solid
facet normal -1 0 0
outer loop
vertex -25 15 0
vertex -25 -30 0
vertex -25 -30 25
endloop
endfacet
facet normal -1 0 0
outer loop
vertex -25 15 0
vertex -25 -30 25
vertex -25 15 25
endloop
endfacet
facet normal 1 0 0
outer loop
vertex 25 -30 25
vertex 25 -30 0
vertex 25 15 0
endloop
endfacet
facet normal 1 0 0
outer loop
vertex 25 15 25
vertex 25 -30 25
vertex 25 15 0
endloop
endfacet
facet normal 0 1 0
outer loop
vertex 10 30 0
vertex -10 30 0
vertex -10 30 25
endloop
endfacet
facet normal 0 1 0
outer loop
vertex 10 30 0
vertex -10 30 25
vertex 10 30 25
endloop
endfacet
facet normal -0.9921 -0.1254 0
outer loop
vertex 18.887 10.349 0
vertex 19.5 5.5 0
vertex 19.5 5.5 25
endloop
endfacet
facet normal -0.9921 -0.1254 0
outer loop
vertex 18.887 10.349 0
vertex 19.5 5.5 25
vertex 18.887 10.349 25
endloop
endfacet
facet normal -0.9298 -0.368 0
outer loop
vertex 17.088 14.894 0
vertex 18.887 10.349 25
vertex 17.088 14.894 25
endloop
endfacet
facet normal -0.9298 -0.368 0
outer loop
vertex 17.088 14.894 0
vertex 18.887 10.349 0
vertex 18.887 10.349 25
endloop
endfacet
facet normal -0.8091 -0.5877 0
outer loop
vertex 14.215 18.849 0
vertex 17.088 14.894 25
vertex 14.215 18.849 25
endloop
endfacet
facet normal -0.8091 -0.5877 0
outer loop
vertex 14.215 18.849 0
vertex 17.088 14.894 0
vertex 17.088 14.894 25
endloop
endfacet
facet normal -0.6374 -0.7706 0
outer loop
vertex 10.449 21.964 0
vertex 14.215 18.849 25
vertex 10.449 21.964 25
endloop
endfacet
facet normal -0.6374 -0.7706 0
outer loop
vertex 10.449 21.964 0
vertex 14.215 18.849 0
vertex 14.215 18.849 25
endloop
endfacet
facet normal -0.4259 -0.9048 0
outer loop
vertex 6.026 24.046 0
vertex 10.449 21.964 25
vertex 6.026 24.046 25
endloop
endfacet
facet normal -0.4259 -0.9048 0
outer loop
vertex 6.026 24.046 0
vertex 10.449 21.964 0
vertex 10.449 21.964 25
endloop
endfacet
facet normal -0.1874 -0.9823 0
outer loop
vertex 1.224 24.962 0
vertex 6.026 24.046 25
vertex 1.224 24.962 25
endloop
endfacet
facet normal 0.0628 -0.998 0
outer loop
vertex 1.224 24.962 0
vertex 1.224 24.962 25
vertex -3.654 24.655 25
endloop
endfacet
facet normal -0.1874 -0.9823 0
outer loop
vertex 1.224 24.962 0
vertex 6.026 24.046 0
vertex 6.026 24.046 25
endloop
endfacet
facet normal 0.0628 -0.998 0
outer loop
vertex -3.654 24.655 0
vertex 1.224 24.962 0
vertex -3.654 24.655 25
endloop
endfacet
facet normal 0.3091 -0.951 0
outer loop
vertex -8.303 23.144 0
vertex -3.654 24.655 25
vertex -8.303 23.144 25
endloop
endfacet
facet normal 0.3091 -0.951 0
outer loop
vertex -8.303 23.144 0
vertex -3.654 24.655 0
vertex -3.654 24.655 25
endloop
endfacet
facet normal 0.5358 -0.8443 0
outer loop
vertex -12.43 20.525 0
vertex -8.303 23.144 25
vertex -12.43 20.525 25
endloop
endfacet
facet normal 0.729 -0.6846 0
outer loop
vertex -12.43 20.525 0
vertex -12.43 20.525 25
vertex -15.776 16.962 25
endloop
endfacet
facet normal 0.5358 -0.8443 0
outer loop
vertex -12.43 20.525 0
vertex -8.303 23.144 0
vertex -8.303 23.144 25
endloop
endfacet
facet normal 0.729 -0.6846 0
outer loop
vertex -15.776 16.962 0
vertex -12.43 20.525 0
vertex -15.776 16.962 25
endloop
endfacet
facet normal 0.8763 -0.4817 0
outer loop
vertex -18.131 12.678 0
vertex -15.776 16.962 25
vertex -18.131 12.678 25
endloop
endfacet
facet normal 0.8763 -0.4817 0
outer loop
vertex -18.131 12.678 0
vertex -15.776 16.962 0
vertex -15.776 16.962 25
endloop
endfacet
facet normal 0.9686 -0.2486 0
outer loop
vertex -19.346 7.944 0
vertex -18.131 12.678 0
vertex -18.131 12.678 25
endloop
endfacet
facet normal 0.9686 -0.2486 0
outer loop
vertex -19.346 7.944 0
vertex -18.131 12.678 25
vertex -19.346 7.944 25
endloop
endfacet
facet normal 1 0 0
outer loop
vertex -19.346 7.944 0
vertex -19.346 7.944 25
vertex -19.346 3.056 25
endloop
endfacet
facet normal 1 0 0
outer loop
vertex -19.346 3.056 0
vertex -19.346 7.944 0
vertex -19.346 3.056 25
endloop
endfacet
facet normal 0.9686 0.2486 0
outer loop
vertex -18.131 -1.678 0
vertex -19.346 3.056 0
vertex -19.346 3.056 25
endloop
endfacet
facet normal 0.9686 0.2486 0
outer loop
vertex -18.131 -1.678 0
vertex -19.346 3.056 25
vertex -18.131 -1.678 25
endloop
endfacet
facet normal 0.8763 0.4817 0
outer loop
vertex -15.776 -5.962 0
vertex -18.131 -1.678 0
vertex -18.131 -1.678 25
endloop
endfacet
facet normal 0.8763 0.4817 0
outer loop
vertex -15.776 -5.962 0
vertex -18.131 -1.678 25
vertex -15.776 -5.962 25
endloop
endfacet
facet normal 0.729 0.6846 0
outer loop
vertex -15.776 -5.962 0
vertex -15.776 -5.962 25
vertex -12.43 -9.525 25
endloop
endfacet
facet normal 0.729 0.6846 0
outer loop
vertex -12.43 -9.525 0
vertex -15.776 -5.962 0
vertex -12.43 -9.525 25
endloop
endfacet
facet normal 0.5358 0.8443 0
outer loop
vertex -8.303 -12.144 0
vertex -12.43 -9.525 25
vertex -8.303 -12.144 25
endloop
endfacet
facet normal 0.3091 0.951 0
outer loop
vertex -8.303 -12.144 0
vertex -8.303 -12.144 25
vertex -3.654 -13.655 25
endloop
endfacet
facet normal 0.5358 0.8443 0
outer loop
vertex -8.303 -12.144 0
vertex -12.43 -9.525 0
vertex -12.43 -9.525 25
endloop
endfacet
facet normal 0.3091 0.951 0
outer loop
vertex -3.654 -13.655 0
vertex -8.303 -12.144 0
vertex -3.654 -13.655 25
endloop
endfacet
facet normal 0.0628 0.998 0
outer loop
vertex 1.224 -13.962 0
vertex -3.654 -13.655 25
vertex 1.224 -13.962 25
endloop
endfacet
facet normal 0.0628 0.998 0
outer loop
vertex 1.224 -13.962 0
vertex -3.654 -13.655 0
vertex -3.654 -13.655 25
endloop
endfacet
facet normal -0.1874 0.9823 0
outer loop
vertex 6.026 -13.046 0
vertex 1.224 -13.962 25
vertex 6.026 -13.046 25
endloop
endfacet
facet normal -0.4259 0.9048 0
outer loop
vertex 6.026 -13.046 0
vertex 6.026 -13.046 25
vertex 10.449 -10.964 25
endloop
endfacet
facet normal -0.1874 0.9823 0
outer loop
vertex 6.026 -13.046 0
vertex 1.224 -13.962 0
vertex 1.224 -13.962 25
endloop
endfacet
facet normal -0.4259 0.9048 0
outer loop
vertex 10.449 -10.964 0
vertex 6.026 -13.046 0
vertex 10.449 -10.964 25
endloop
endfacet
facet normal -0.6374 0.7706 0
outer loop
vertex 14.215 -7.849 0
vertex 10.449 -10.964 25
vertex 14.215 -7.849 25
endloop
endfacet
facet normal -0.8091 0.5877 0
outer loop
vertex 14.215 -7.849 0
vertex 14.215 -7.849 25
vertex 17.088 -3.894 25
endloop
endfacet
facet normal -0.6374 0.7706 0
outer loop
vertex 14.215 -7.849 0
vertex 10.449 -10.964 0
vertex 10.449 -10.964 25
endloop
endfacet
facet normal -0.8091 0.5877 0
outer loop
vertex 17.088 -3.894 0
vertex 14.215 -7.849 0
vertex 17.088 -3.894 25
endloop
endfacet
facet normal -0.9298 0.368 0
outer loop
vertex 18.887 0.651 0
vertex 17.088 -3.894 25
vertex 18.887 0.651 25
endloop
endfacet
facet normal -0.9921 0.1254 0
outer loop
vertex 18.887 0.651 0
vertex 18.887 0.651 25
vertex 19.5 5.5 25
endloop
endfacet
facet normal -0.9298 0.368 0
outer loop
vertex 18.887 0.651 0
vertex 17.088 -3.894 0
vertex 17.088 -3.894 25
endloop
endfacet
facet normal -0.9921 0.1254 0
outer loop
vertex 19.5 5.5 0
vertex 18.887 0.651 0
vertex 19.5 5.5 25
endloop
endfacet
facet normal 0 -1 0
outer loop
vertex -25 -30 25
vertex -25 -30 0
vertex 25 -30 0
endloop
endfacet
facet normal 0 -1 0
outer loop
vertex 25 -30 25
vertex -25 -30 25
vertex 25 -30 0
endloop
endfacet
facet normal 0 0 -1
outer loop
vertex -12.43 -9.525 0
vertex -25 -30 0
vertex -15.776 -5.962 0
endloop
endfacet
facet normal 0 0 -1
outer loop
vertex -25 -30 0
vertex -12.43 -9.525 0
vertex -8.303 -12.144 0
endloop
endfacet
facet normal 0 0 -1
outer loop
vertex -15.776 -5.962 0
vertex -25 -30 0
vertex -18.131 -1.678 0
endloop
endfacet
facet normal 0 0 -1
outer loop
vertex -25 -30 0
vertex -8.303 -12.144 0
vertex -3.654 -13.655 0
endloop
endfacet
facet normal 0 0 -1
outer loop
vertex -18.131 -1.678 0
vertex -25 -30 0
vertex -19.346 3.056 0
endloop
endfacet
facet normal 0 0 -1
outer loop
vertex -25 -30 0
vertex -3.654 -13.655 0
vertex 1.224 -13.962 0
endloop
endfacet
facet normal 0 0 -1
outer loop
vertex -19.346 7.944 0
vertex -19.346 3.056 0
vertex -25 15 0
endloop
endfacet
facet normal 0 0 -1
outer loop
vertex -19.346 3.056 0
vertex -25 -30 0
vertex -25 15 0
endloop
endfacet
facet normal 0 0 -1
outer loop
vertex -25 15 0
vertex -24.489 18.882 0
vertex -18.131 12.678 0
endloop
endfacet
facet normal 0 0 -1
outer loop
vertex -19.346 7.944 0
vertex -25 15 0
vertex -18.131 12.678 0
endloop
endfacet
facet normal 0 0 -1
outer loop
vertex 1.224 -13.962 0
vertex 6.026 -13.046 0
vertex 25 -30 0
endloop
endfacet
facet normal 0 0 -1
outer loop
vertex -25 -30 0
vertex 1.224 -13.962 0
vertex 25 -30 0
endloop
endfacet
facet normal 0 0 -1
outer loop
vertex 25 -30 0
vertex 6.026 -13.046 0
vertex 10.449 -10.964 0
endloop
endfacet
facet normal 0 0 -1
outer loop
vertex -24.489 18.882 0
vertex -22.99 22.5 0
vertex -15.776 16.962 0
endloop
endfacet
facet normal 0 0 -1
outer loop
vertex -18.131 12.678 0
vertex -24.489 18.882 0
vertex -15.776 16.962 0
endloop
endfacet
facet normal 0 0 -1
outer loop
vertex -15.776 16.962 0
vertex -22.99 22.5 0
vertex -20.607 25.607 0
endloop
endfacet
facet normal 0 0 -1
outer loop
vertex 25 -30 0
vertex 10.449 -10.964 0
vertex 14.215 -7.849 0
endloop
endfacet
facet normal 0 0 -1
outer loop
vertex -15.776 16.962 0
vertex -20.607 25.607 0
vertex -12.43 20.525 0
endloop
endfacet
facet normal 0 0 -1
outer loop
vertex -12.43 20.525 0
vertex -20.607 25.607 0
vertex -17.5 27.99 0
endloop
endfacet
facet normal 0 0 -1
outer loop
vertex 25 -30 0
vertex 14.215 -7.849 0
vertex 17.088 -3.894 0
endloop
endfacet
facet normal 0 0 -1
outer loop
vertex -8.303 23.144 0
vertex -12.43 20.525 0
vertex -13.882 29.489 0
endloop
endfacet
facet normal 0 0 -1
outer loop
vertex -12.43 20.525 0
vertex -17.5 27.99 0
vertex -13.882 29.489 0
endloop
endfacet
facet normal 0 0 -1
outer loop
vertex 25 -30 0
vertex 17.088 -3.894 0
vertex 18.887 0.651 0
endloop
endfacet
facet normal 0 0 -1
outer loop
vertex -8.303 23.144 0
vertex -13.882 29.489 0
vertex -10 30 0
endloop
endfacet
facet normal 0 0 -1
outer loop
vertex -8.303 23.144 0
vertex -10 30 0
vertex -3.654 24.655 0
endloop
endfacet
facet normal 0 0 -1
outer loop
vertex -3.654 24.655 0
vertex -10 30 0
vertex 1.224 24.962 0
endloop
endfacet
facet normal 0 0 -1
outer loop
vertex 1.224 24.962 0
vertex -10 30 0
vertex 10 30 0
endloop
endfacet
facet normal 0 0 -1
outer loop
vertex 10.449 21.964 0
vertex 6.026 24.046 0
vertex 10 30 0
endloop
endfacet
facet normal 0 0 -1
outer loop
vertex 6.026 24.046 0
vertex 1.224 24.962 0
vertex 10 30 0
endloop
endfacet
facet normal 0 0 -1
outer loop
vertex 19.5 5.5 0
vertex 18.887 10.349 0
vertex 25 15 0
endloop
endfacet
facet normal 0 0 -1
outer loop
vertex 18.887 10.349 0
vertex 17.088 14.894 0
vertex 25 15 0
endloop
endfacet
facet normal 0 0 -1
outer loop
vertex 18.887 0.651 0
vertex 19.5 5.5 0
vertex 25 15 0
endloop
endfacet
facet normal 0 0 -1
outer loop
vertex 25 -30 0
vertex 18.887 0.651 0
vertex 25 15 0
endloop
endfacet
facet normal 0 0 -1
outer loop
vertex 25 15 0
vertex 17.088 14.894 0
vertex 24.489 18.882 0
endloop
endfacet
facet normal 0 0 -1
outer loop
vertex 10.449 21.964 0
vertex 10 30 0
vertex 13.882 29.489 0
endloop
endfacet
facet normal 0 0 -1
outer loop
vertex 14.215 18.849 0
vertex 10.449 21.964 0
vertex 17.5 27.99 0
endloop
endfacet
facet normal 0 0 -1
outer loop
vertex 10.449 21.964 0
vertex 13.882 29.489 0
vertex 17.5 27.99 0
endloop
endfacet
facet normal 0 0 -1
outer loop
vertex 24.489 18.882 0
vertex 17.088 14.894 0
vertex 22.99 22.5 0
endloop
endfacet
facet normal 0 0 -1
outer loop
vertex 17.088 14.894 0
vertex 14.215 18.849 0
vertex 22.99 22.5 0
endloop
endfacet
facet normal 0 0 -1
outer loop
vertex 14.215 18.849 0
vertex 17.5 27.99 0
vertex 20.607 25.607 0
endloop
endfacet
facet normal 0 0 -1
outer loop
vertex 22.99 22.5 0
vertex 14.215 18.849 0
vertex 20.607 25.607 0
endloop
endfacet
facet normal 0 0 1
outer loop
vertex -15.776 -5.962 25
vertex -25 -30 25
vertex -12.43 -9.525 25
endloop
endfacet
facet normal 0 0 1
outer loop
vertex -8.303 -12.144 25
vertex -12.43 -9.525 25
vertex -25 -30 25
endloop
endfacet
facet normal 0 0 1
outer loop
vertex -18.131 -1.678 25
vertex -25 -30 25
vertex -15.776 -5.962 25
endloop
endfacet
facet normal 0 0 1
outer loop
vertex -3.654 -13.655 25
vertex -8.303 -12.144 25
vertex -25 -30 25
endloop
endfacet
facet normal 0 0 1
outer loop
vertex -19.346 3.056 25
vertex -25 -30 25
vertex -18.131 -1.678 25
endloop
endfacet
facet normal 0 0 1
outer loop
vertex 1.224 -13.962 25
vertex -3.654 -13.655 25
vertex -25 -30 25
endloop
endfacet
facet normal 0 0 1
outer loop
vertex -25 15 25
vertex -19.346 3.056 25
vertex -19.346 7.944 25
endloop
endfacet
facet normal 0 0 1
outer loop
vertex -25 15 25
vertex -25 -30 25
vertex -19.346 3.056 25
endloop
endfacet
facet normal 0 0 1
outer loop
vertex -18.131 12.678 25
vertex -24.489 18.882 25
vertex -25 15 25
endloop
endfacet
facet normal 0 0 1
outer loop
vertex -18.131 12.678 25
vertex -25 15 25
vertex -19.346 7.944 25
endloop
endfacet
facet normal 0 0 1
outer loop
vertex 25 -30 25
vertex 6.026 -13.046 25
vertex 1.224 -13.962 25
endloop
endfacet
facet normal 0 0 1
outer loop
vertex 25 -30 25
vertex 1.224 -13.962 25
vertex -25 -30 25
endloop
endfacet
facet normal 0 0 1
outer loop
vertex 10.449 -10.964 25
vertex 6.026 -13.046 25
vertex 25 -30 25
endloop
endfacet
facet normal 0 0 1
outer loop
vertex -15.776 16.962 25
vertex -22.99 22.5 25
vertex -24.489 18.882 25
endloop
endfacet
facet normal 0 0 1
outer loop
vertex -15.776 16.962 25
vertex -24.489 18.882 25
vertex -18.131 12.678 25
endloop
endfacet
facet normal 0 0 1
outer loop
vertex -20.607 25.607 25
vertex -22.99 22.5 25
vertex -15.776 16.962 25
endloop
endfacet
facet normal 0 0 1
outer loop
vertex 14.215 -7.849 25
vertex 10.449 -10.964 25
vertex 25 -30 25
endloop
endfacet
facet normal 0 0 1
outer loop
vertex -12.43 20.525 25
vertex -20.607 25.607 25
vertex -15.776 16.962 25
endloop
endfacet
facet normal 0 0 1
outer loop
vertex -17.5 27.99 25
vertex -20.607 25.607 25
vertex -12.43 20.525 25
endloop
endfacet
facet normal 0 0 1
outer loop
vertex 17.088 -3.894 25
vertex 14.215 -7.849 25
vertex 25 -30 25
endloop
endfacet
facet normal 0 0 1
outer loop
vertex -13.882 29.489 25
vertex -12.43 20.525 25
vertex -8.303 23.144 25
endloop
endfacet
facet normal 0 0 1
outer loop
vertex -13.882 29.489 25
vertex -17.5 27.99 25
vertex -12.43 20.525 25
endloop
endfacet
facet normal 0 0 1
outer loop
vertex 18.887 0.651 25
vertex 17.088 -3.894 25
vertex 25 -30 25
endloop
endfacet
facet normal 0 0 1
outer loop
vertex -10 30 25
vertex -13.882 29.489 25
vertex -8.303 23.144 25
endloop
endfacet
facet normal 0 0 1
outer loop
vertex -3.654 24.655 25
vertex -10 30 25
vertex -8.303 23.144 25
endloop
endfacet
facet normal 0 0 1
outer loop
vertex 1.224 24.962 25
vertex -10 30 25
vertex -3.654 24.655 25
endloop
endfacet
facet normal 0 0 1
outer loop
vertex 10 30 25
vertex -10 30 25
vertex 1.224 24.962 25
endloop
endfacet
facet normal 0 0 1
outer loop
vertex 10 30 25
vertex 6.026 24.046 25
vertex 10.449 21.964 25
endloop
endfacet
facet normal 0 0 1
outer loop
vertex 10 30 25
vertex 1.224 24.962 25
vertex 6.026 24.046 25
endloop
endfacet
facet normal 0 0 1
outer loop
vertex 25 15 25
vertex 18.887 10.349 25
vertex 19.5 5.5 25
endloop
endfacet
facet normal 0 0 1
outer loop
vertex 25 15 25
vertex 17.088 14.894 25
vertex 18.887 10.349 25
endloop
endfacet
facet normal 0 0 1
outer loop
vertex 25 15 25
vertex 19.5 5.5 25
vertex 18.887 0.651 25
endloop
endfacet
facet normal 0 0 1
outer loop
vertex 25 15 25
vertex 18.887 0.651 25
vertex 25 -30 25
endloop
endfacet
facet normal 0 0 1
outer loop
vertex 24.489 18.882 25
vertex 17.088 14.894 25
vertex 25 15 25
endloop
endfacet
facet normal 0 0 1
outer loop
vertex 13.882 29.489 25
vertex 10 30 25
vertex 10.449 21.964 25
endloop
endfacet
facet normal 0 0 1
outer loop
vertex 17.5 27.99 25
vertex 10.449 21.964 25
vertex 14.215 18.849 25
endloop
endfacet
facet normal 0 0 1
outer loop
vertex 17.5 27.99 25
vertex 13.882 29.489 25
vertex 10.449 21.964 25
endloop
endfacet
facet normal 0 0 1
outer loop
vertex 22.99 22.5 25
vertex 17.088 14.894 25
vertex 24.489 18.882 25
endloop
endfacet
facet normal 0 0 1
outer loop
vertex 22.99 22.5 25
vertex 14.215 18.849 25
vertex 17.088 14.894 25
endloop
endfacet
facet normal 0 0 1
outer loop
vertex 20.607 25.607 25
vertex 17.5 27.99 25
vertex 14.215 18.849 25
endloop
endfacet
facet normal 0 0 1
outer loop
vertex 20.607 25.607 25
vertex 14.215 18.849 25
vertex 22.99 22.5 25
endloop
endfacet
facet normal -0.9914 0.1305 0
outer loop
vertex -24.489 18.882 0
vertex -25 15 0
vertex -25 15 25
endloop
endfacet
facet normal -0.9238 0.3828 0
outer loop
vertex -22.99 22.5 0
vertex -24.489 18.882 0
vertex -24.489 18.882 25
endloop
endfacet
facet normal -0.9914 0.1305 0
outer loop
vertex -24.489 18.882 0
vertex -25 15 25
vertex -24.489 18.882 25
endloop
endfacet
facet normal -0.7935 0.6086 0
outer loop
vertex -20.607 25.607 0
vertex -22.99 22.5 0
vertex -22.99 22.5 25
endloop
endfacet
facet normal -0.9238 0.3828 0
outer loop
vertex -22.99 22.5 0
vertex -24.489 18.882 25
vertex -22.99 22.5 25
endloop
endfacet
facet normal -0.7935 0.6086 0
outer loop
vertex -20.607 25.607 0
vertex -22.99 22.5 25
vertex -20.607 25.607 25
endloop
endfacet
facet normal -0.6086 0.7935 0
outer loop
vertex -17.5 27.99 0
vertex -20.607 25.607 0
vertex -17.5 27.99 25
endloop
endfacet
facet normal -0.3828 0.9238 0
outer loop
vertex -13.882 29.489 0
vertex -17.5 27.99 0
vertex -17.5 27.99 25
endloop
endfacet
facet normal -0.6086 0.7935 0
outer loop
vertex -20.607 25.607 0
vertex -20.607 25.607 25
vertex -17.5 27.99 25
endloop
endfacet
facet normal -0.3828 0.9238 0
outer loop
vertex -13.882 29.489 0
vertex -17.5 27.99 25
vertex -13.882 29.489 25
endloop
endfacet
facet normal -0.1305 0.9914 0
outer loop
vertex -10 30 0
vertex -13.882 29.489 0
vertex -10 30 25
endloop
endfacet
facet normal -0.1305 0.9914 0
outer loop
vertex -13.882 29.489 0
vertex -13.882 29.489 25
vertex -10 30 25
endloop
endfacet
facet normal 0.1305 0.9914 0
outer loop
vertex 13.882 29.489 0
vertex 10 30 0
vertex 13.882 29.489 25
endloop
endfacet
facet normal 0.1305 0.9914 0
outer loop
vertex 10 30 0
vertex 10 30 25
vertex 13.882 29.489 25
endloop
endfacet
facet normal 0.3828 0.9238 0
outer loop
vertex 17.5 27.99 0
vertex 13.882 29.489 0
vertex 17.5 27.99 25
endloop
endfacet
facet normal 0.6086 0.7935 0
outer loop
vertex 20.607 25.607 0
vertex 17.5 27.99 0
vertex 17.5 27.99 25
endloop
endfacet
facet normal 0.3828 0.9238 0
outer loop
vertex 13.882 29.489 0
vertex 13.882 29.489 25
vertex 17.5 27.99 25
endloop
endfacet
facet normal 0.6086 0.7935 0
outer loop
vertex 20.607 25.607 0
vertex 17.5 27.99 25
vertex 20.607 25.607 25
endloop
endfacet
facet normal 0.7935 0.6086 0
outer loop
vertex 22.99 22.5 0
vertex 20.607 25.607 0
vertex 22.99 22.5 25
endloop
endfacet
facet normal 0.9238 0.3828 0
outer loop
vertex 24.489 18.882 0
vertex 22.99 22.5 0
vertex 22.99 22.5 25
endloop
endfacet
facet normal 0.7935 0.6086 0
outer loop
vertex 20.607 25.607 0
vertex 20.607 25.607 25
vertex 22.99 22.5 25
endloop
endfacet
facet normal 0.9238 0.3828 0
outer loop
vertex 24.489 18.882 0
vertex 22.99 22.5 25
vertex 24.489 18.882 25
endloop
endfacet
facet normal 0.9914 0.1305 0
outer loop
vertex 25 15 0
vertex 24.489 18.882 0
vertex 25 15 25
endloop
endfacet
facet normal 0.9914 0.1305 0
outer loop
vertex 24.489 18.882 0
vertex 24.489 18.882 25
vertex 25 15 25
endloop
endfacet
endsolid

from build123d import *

# Parameters (mm, degrees)
F0_W     = 50
F0_H     = 60
F0_R     = 19.5
F1_DEPTH = 25
F2_R     = 15
F3_R     = 15


with BuildPart() as f1:
    # F0 (on Top) → F1 (new body)
    with BuildSketch(Plane.XY):
        Rectangle(F0_W, F0_H)
        with Locations((0, 5.5)):
            Circle(F0_R, mode=Mode.SUBTRACT)
    extrude(amount=F1_DEPTH)

    # F2
    f2_edges = [f1.edges().sort_by_distance(p)[0] for p in [
        (-25, 30, 12.5),
    ]]
    fillet(f2_edges, radius=F2_R)

    # F3
    f3_edges = [f1.edges().sort_by_distance(p)[0] for p in [
        (25, 30, 12.5),
    ]]
    fillet(f3_edges, radius=F3_R)


solid = f1.part
